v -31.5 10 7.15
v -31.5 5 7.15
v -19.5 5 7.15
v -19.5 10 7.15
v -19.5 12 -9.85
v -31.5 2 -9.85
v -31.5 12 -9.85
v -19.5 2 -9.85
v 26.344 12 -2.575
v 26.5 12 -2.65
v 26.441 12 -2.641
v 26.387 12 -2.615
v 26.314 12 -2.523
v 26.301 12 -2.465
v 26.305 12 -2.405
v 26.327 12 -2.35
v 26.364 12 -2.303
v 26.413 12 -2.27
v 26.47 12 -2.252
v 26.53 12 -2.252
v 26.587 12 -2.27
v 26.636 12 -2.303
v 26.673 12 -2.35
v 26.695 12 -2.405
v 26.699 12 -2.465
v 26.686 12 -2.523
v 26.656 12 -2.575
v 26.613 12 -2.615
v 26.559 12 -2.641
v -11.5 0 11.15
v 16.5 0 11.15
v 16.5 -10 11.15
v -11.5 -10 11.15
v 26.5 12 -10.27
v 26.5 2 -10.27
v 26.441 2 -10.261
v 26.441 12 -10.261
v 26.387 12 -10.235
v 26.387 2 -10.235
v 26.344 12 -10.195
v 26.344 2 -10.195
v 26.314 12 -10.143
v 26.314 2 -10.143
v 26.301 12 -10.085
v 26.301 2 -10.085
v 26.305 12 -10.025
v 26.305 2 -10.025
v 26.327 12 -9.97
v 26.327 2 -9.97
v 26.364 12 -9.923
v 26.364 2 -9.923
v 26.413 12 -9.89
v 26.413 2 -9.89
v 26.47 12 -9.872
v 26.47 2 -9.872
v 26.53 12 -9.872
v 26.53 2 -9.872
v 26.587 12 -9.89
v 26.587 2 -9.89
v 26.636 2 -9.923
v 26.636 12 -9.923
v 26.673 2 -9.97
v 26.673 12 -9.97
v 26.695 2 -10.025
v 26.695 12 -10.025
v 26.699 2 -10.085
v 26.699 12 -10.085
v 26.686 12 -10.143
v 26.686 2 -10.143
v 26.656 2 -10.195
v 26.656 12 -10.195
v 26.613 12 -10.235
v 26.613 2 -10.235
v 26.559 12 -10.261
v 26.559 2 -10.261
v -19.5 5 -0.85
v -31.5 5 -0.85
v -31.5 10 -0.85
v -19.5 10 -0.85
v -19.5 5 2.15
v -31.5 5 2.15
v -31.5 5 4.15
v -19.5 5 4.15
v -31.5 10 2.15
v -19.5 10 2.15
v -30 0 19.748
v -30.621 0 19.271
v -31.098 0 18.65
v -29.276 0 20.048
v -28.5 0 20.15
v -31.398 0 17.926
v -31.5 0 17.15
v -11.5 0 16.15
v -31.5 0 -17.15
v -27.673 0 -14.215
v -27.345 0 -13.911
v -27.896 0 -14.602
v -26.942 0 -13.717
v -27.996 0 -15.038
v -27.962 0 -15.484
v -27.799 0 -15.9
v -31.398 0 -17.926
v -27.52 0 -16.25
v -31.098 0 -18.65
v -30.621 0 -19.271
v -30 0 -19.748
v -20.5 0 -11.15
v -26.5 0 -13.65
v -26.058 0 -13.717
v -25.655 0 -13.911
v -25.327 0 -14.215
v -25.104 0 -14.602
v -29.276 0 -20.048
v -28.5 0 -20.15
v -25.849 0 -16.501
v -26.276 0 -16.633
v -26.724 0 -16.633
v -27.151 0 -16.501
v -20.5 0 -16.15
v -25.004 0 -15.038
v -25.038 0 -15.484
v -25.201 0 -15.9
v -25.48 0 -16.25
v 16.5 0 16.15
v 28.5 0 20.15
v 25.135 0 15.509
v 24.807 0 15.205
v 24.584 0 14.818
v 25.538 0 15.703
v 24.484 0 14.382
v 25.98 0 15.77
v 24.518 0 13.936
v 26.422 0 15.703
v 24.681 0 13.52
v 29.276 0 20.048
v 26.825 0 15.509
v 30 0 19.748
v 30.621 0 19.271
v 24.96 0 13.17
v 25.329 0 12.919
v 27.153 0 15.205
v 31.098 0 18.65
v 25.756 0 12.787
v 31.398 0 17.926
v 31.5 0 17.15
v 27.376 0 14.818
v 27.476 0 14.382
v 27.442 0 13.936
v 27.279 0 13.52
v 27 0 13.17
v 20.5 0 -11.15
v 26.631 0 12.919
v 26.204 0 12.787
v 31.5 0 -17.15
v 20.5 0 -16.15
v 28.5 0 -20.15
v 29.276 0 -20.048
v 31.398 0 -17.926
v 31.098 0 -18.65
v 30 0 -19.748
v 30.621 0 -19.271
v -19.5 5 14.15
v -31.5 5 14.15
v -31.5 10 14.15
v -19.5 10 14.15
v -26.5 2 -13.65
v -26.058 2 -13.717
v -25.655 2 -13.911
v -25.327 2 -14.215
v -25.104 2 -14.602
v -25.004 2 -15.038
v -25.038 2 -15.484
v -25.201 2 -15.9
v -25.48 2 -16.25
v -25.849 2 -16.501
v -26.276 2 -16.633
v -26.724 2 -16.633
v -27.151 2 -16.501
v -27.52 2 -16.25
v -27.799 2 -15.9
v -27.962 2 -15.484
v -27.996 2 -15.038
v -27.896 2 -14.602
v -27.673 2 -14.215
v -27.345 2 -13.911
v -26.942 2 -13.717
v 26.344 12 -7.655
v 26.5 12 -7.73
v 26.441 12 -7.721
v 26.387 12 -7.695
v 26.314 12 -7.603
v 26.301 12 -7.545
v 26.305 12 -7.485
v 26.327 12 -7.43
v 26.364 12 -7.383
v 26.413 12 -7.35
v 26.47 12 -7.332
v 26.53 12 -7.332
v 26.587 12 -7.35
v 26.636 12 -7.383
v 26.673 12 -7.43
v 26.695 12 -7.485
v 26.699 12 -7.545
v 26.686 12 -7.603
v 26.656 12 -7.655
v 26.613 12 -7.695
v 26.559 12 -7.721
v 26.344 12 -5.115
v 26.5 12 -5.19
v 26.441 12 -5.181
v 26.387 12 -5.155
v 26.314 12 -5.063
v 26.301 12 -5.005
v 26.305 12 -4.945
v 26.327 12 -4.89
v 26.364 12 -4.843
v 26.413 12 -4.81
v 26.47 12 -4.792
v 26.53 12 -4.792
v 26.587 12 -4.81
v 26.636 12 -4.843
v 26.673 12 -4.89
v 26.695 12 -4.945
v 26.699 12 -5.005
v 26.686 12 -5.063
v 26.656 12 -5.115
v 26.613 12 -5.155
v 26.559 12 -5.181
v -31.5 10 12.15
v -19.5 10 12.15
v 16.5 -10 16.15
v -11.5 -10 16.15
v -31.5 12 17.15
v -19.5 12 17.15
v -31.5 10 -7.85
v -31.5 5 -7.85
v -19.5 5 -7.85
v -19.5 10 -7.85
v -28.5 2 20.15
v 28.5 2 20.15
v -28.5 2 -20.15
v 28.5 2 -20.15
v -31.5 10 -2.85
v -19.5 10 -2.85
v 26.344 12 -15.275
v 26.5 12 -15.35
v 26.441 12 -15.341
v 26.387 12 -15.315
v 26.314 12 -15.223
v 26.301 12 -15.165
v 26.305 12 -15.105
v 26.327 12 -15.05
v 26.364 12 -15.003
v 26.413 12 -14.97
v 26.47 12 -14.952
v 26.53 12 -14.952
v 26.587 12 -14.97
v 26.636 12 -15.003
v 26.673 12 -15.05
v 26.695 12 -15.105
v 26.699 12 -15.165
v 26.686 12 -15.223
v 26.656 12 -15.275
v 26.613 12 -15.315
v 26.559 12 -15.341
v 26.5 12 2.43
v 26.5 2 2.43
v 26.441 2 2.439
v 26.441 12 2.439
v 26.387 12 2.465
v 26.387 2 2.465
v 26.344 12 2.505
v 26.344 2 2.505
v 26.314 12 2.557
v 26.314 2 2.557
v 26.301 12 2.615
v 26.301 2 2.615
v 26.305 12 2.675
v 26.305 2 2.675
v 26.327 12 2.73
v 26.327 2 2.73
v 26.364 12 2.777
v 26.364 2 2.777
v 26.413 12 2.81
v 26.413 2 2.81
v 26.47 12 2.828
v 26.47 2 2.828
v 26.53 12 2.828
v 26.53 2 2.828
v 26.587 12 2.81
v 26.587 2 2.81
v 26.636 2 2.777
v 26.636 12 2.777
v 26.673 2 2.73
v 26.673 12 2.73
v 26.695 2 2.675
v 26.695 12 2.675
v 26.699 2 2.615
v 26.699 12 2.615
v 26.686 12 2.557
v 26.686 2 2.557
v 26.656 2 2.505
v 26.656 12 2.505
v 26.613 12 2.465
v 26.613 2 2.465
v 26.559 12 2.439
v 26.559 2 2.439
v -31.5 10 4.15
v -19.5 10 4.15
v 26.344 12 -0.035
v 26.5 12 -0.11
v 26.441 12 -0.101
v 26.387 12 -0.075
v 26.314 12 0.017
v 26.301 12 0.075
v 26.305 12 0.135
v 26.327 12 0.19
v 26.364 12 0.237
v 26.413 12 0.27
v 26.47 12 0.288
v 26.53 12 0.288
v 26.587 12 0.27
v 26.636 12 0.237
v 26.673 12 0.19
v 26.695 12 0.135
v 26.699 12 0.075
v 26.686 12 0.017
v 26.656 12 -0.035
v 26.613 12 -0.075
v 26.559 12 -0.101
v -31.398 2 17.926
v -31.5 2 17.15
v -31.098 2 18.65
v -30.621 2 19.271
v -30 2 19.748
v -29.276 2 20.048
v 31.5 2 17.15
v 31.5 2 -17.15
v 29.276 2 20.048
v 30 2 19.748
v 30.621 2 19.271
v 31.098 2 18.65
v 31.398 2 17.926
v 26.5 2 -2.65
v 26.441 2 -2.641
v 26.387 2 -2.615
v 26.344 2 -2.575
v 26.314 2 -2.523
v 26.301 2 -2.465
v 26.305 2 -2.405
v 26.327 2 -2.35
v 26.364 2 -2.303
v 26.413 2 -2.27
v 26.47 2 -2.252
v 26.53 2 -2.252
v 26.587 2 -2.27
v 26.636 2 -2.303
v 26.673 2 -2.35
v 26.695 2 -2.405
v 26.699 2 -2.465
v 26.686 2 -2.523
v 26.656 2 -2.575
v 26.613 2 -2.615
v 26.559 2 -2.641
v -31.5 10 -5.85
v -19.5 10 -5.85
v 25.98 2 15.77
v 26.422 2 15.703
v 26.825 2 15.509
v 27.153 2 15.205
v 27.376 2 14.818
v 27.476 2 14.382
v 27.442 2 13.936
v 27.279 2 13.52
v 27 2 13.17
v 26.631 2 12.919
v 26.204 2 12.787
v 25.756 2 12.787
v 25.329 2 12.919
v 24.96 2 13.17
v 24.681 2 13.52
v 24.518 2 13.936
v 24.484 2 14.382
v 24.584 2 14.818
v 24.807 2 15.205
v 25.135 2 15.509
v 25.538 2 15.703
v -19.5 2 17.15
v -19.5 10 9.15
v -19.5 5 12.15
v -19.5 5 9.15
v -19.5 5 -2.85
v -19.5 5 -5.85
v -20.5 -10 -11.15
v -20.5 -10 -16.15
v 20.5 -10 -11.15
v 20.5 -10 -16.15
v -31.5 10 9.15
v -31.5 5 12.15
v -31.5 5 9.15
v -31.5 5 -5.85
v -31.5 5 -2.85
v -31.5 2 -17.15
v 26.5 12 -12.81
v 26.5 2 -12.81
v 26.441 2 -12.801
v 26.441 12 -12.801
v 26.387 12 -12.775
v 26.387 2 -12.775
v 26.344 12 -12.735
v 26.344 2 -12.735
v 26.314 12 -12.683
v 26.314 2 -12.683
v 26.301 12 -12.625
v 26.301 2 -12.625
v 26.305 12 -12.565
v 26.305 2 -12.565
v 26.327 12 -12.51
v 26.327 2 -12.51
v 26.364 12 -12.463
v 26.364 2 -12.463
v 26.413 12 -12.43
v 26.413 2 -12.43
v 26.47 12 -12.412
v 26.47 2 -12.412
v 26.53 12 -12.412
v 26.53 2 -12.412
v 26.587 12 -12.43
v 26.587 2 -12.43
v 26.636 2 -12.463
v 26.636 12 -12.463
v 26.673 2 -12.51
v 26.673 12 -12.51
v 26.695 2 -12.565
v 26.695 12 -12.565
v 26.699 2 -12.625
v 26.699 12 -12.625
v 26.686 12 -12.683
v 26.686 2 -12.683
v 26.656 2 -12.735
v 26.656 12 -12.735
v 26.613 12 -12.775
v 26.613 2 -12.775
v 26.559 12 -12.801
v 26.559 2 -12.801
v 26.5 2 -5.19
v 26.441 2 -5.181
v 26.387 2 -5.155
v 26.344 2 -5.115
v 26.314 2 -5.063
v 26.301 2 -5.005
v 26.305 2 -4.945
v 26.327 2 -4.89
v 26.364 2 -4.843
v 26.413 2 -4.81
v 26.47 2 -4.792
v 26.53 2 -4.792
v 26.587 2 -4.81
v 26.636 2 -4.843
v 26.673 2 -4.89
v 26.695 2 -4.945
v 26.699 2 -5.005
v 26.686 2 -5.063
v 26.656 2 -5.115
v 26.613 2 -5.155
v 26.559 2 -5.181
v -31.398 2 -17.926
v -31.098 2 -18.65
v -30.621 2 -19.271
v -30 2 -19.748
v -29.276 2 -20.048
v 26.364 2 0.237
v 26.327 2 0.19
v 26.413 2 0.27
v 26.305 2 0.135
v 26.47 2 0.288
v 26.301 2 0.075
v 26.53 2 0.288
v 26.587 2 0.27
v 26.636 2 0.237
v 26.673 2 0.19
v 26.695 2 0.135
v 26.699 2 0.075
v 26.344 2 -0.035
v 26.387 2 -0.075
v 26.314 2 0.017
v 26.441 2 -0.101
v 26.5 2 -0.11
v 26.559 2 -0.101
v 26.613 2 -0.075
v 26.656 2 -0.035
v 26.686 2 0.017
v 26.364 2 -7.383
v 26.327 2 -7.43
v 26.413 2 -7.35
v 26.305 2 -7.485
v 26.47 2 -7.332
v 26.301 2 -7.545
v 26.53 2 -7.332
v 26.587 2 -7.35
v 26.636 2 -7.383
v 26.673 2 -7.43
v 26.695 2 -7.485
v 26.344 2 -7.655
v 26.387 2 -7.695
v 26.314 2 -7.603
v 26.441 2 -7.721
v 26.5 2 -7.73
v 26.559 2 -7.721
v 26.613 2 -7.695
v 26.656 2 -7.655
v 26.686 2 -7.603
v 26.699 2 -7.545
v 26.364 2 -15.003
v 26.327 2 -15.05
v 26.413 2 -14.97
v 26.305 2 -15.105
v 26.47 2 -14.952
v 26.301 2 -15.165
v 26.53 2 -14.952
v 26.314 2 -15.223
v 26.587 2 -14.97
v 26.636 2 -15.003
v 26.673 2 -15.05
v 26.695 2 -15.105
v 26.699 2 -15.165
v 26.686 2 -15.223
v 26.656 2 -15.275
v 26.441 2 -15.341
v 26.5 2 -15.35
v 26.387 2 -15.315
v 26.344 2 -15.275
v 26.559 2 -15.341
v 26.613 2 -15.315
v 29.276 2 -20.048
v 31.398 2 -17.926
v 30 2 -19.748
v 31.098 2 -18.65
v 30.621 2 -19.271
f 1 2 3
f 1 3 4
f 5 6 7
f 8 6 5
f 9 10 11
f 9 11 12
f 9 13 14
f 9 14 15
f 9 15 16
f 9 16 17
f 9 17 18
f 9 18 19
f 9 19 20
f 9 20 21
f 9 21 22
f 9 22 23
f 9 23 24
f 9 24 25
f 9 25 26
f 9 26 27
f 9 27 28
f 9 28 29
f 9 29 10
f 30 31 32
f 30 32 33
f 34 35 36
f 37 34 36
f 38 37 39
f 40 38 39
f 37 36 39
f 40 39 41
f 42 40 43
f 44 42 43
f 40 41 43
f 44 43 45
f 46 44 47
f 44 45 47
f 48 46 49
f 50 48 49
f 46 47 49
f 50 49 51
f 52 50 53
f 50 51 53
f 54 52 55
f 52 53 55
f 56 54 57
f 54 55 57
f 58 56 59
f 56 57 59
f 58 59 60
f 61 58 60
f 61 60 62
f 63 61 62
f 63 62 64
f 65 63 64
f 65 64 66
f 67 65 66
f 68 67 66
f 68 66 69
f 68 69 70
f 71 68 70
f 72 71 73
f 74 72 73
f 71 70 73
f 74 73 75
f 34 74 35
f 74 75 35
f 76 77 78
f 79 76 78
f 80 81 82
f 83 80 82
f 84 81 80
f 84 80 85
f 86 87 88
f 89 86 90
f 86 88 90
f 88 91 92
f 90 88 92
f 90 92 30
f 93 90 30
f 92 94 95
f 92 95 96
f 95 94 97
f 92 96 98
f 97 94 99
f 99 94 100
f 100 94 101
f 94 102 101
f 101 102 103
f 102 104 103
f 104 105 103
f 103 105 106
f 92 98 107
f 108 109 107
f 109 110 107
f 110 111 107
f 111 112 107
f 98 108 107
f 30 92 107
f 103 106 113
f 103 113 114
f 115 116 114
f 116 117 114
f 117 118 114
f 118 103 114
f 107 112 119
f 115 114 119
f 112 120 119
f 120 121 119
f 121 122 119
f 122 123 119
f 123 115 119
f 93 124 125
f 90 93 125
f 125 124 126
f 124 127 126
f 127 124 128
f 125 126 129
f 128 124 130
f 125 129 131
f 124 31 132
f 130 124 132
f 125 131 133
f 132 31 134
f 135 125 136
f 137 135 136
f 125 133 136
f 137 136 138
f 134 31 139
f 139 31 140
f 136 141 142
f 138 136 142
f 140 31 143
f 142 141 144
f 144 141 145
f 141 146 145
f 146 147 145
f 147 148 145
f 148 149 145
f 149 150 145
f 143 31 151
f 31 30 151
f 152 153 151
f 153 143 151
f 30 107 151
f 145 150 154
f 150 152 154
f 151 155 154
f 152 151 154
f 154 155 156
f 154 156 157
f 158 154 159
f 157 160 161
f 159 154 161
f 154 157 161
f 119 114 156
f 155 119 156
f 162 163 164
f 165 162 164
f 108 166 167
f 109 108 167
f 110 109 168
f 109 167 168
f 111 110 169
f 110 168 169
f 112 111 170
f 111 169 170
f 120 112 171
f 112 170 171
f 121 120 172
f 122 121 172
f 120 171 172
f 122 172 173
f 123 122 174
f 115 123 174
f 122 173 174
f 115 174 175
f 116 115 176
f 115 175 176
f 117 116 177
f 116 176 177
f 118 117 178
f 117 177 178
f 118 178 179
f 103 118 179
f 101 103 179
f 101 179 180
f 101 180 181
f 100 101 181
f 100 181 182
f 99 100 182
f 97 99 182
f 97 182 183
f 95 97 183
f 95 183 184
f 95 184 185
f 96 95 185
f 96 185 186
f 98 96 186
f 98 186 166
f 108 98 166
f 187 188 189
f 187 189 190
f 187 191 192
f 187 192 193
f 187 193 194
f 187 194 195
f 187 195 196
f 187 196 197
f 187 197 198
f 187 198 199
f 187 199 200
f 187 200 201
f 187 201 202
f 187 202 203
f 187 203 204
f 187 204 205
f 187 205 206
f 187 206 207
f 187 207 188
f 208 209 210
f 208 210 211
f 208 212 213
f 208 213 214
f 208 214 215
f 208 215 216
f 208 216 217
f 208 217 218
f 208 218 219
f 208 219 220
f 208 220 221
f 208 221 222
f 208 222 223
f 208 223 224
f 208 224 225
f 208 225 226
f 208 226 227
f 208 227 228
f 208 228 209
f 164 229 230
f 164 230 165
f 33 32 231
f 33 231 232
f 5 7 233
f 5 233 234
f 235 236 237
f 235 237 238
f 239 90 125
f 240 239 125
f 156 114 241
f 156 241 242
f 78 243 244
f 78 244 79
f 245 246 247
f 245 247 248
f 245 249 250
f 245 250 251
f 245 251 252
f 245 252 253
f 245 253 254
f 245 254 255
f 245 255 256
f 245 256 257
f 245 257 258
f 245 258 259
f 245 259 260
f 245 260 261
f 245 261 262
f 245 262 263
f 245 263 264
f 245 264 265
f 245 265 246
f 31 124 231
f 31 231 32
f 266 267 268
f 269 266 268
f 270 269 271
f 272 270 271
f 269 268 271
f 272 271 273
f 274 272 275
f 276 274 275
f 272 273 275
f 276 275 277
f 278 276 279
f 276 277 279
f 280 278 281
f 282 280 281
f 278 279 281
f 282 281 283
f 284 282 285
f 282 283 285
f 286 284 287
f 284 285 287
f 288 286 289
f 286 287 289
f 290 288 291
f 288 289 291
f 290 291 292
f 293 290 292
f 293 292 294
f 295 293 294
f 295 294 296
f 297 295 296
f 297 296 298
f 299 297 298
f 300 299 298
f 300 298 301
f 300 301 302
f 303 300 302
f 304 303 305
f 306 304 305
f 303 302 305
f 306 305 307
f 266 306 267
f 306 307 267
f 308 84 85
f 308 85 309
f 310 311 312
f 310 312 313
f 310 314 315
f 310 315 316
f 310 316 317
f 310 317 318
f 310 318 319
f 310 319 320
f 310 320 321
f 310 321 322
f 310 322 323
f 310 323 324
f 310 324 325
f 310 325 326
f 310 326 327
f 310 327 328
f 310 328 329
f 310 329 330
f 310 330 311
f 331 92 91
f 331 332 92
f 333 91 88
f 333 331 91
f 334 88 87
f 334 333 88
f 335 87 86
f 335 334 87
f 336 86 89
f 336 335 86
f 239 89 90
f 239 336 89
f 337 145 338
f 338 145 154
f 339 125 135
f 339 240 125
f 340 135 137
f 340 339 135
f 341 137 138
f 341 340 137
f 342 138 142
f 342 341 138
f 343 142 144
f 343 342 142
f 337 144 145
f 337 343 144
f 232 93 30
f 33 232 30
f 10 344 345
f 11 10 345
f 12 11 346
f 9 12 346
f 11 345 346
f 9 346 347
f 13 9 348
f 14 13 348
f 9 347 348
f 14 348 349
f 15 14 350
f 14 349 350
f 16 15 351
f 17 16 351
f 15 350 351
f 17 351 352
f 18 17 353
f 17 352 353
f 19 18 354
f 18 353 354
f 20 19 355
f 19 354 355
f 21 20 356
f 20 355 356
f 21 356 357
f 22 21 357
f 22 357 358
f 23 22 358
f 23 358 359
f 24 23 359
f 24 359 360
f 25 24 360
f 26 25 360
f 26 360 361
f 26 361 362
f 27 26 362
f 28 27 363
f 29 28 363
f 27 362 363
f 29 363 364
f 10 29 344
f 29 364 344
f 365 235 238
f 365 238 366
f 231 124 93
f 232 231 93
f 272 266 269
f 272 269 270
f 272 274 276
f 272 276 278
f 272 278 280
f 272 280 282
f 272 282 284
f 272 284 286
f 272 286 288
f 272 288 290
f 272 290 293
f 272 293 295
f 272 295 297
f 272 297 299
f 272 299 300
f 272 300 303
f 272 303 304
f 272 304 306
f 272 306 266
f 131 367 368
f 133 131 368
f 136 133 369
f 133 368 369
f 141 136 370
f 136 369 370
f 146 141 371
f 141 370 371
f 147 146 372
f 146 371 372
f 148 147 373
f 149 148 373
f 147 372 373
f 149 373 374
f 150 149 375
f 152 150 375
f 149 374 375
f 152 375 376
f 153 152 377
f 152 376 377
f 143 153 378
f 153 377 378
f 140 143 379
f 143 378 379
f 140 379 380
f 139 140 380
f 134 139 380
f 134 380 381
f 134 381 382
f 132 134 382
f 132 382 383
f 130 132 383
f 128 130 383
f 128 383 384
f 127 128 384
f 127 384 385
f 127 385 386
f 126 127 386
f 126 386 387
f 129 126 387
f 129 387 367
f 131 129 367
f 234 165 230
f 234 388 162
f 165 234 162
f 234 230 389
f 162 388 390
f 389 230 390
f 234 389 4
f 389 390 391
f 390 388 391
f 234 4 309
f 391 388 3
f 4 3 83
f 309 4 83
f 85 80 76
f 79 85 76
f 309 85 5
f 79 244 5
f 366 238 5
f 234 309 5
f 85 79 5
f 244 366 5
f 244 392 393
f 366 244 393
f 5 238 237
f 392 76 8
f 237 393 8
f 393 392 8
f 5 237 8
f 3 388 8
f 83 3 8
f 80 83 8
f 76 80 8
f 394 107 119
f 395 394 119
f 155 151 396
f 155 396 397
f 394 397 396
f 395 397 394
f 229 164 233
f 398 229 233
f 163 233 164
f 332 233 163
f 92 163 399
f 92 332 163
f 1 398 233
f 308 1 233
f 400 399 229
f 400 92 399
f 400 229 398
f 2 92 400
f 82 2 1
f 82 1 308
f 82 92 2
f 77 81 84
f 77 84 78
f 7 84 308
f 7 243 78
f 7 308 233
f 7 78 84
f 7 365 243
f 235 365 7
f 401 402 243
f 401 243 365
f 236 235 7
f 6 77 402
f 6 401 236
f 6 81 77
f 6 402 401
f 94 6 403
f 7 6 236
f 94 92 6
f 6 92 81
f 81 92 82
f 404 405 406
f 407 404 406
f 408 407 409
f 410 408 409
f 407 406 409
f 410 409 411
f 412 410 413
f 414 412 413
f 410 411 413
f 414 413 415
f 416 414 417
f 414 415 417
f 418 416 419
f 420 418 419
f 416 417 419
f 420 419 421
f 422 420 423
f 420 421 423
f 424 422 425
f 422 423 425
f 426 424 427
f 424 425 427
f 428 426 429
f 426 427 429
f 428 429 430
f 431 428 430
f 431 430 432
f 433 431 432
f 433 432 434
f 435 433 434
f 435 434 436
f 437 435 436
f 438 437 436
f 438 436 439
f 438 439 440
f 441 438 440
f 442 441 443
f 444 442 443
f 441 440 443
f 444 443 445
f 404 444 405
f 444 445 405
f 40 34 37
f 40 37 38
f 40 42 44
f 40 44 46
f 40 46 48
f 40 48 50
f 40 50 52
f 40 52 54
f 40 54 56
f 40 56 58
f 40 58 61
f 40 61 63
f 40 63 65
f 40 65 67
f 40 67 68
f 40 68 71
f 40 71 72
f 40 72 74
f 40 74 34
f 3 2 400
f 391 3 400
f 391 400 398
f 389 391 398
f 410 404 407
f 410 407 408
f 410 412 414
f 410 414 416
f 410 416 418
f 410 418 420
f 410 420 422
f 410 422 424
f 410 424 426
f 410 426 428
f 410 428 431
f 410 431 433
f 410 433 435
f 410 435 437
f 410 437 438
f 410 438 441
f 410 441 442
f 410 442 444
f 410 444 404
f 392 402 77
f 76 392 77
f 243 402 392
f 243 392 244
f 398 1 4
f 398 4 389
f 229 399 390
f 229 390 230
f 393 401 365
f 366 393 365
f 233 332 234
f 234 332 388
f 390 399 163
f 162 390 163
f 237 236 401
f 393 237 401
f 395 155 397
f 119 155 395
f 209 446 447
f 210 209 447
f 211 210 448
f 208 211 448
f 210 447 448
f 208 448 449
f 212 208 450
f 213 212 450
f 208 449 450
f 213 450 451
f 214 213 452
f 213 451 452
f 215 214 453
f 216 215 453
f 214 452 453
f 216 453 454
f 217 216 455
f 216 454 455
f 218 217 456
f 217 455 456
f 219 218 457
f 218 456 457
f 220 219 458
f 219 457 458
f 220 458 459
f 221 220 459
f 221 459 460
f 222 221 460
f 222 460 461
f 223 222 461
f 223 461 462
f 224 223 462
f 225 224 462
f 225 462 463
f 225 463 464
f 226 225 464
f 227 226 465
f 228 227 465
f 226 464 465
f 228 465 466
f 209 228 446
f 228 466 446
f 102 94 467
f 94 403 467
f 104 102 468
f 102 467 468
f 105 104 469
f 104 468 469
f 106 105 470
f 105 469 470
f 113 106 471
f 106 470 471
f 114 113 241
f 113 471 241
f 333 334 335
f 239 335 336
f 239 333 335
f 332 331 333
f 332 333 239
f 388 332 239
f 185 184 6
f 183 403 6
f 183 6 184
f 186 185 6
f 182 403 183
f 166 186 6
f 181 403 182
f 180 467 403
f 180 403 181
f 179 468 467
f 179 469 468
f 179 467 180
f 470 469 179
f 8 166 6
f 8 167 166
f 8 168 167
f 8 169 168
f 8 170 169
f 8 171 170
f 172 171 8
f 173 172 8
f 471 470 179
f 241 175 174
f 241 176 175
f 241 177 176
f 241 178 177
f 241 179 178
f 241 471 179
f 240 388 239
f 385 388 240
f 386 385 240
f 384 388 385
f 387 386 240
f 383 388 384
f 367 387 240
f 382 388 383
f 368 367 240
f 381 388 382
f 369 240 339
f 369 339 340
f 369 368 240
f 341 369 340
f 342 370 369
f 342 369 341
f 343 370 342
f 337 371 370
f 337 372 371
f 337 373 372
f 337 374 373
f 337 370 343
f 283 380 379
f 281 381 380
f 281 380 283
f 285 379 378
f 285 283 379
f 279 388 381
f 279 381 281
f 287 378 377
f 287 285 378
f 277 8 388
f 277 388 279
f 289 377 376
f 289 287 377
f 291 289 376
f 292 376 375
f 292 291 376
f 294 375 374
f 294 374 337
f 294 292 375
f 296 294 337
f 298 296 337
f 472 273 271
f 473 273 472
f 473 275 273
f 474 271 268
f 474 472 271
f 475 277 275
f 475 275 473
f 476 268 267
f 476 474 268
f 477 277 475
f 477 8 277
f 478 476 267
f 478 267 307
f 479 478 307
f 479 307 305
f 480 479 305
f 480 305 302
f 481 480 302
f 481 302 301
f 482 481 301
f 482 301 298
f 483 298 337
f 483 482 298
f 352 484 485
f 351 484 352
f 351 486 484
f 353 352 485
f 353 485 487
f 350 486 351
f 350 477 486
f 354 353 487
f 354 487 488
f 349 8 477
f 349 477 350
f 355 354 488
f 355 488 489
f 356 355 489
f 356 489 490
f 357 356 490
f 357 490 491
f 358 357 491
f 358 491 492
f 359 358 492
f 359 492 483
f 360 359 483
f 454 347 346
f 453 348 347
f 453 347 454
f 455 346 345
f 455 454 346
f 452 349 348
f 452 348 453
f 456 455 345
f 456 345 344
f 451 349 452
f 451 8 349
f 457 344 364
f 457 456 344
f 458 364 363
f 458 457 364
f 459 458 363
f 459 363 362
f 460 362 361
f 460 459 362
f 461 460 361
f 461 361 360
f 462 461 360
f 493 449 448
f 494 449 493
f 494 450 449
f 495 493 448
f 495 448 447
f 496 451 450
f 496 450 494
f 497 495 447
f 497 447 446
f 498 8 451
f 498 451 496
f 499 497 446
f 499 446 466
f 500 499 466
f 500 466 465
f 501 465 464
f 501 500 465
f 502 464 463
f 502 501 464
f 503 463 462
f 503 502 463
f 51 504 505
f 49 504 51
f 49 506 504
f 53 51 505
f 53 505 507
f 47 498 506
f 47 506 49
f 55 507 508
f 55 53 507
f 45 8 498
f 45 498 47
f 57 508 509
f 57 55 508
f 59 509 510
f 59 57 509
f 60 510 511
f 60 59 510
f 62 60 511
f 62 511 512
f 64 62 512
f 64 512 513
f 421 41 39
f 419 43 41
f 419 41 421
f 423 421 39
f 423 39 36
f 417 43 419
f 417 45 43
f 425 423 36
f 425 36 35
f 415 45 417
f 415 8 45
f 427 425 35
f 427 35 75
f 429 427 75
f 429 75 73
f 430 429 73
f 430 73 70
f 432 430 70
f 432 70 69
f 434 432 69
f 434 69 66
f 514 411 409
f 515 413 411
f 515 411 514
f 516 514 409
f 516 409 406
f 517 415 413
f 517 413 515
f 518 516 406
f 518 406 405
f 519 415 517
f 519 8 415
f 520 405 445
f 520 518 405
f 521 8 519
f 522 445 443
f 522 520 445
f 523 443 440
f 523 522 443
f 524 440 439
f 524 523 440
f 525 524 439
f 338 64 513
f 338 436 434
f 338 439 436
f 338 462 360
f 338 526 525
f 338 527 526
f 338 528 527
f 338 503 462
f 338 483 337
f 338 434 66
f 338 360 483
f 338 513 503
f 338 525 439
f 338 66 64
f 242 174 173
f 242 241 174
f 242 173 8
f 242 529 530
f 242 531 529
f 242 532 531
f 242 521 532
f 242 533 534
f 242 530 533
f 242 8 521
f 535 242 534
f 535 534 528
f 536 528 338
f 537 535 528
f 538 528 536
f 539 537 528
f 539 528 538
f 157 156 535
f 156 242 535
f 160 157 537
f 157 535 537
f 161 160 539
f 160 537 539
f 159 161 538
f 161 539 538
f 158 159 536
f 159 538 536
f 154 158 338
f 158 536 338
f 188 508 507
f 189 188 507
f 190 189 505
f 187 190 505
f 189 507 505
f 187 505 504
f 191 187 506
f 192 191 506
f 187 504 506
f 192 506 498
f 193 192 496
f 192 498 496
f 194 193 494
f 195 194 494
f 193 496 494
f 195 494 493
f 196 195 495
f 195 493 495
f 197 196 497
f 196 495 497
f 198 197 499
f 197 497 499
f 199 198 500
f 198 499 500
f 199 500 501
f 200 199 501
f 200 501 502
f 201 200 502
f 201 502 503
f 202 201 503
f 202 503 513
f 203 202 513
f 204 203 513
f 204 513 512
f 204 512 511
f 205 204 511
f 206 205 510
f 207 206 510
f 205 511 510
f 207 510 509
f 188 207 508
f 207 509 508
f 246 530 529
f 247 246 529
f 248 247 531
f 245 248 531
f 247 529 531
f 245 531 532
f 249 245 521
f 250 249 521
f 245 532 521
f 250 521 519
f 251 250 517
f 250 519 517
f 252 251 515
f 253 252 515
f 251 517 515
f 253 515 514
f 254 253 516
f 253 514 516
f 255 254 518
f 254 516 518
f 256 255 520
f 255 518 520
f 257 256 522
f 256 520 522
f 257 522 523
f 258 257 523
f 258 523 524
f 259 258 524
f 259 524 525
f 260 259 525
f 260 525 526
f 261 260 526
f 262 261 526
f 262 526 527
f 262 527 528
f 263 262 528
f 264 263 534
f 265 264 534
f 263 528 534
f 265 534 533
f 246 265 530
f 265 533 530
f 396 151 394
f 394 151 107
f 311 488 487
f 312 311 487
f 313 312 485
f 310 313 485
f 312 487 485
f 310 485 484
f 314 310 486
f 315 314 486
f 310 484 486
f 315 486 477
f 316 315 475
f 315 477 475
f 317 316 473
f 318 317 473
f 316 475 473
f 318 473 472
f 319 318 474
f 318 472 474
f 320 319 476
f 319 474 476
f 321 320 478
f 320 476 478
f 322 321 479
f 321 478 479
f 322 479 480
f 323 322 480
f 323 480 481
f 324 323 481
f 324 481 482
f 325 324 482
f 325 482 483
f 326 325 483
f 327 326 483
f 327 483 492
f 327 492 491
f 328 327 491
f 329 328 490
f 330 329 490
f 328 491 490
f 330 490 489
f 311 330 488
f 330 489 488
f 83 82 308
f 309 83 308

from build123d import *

# Parameters (mm, degrees)
SKETCH_1_W             = 63
SKETCH_1_H             = 40.3
EXTRUDE_1_DEPTH        = 2
CUT_EXTRUDE_1_REACH    = 39.447
SKETCH_2_R             = 1.5
FILLET_1_R             = 3
SKETCH_3_W             = 41
SKETCH_3_H             = 5
SKETCH_3_W_2           = 28
EXTRUDE_2_DEPTH        = 10
SKETCH_4_W             = 12
SKETCH_4_H             = 27
EXTRUDE_3_DEPTH        = 10
CUT_EXTRUDE_2_REACH    = 69.224
SKETCH_5_W             = 2
SKETCH_5_H             = 5
PATTERN_LINEAR_1_COUNT = 5
PATTERN_LINEAR_1_PITCH = 5
SKETCH_6_R             = 0.2
EXTRUDE_4_DEPTH        = 10
PATTERN_LINEAR_2_COUNT = 8
PATTERN_LINEAR_2_PITCH = 2.54


with BuildPart() as part:
    # 草图1 → 凸台-拉伸1 (new body)
    with BuildSketch(Plane(origin=(0, 0, 0), x_dir=(1, 0, 0), z_dir=(0, 1, 0))):
        Rectangle(SKETCH_1_W, SKETCH_1_H)
    extrude(amount=EXTRUDE_1_DEPTH)

    # 草图2 → 切除-拉伸1 (cut, up to next)
    with BuildSketch(Plane(origin=(0, 2, 0), x_dir=(1, 0, 0), z_dir=(0, 1, 0)), mode=Mode.PRIVATE) as cut_extrude_1_sk1:
        with Locations(Location((-26.5, 15.15, 0), (0, 0, 270))):
            Circle(SKETCH_2_R)
    cut_extrude_1_tool1 = extrude(cut_extrude_1_sk1.sketch, amount=-CUT_EXTRUDE_1_REACH, mode=Mode.PRIVATE) & part.part
    # 草图2 → 切除-拉伸1 (cut, up to next)
    with BuildSketch(Plane(origin=(0, 2, 0), x_dir=(1, 0, 0), z_dir=(0, 1, 0)), mode=Mode.PRIVATE) as cut_extrude_1_sk2:
        with Locations(Location((25.98, -14.27, 0), (0, 0, 270))):
            Circle(SKETCH_2_R)
    cut_extrude_1_tool2 = extrude(cut_extrude_1_sk2.sketch, amount=-CUT_EXTRUDE_1_REACH, mode=Mode.PRIVATE) & part.part
    add(cut_extrude_1_tool1.solids().sort_by_distance((-26.5, 2, -15.15))[0], mode=Mode.SUBTRACT)
    add(cut_extrude_1_tool2.solids().sort_by_distance((25.98, 2, 14.27))[0], mode=Mode.SUBTRACT)

    # 圆角1
    fillet_1_edges = [part.edges().sort_by_distance(p)[0] for p in [
        (31.5, 1, 20.15),
        (-31.5, 1, 20.15),
        (-31.5, 1, -20.15),
        (31.5, 1, -20.15),
    ]]
    fillet(fillet_1_edges, radius=FILLET_1_R)

    # 草图3 → 凸台-拉伸2 (add)
    with BuildSketch(Plane(origin=(0, 0, 0), x_dir=(-1, 0, 0), z_dir=(0, -1, 0))):
        with Locations((0, 13.65)):
            Rectangle(SKETCH_3_W, SKETCH_3_H)
        with Locations((-2.5, -13.65)):
            Rectangle(SKETCH_3_W_2, SKETCH_3_H)
    extrude(amount=EXTRUDE_2_DEPTH)

    # 草图4 → 凸台-拉伸3 (add)
    with BuildSketch(Plane(origin=(0, 2, 0), x_dir=(1, 0, 0), z_dir=(0, 1, 0))):
        with Locations((-25.5, -3.65)):
            Rectangle(SKETCH_4_W, SKETCH_4_H)
    extrude(amount=EXTRUDE_3_DEPTH)

    # 草图5 → 切除-拉伸2 (cut, up to next)
    with BuildSketch(Plane.ZY.offset(31.5), mode=Mode.PRIVATE) as cut_extrude_2_sk1:
        with Locations((-6.85, 7.5)):
            Rectangle(SKETCH_5_W, SKETCH_5_H)
    cut_extrude_2_tool1 = extrude(cut_extrude_2_sk1.sketch, amount=-CUT_EXTRUDE_2_REACH, mode=Mode.PRIVATE) & part.part
    cut_extrude_2 = cut_extrude_2_tool1.solids().sort_by_distance((-31.5, 7.5, -6.85))[0]
    add(cut_extrude_2, mode=Mode.SUBTRACT)

    # 阵列(线性)1: 切除-拉伸2 ×5
    with Locations(*[(0, 0, i * PATTERN_LINEAR_1_PITCH) for i in range(1, PATTERN_LINEAR_1_COUNT)]):
        add(cut_extrude_2, mode=Mode.SUBTRACT)

    # 草图6 → 凸台-拉伸4 (add)
    with BuildSketch(Plane(origin=(0, 2, 0), x_dir=(1, 0, 0), z_dir=(0, 1, 0))):
        with Locations(Location((26.5, 15.15, 0), (0, 0, 90))):
            Circle(SKETCH_6_R)
    extrude_4 = extrude(amount=EXTRUDE_4_DEPTH)

    # 阵列(线性)2: 凸台-拉伸4 ×8
    with Locations(*[(0, 0, i * PATTERN_LINEAR_2_PITCH) for i in range(1, PATTERN_LINEAR_2_COUNT)]):
        add(extrude_4)


solid = part.part
